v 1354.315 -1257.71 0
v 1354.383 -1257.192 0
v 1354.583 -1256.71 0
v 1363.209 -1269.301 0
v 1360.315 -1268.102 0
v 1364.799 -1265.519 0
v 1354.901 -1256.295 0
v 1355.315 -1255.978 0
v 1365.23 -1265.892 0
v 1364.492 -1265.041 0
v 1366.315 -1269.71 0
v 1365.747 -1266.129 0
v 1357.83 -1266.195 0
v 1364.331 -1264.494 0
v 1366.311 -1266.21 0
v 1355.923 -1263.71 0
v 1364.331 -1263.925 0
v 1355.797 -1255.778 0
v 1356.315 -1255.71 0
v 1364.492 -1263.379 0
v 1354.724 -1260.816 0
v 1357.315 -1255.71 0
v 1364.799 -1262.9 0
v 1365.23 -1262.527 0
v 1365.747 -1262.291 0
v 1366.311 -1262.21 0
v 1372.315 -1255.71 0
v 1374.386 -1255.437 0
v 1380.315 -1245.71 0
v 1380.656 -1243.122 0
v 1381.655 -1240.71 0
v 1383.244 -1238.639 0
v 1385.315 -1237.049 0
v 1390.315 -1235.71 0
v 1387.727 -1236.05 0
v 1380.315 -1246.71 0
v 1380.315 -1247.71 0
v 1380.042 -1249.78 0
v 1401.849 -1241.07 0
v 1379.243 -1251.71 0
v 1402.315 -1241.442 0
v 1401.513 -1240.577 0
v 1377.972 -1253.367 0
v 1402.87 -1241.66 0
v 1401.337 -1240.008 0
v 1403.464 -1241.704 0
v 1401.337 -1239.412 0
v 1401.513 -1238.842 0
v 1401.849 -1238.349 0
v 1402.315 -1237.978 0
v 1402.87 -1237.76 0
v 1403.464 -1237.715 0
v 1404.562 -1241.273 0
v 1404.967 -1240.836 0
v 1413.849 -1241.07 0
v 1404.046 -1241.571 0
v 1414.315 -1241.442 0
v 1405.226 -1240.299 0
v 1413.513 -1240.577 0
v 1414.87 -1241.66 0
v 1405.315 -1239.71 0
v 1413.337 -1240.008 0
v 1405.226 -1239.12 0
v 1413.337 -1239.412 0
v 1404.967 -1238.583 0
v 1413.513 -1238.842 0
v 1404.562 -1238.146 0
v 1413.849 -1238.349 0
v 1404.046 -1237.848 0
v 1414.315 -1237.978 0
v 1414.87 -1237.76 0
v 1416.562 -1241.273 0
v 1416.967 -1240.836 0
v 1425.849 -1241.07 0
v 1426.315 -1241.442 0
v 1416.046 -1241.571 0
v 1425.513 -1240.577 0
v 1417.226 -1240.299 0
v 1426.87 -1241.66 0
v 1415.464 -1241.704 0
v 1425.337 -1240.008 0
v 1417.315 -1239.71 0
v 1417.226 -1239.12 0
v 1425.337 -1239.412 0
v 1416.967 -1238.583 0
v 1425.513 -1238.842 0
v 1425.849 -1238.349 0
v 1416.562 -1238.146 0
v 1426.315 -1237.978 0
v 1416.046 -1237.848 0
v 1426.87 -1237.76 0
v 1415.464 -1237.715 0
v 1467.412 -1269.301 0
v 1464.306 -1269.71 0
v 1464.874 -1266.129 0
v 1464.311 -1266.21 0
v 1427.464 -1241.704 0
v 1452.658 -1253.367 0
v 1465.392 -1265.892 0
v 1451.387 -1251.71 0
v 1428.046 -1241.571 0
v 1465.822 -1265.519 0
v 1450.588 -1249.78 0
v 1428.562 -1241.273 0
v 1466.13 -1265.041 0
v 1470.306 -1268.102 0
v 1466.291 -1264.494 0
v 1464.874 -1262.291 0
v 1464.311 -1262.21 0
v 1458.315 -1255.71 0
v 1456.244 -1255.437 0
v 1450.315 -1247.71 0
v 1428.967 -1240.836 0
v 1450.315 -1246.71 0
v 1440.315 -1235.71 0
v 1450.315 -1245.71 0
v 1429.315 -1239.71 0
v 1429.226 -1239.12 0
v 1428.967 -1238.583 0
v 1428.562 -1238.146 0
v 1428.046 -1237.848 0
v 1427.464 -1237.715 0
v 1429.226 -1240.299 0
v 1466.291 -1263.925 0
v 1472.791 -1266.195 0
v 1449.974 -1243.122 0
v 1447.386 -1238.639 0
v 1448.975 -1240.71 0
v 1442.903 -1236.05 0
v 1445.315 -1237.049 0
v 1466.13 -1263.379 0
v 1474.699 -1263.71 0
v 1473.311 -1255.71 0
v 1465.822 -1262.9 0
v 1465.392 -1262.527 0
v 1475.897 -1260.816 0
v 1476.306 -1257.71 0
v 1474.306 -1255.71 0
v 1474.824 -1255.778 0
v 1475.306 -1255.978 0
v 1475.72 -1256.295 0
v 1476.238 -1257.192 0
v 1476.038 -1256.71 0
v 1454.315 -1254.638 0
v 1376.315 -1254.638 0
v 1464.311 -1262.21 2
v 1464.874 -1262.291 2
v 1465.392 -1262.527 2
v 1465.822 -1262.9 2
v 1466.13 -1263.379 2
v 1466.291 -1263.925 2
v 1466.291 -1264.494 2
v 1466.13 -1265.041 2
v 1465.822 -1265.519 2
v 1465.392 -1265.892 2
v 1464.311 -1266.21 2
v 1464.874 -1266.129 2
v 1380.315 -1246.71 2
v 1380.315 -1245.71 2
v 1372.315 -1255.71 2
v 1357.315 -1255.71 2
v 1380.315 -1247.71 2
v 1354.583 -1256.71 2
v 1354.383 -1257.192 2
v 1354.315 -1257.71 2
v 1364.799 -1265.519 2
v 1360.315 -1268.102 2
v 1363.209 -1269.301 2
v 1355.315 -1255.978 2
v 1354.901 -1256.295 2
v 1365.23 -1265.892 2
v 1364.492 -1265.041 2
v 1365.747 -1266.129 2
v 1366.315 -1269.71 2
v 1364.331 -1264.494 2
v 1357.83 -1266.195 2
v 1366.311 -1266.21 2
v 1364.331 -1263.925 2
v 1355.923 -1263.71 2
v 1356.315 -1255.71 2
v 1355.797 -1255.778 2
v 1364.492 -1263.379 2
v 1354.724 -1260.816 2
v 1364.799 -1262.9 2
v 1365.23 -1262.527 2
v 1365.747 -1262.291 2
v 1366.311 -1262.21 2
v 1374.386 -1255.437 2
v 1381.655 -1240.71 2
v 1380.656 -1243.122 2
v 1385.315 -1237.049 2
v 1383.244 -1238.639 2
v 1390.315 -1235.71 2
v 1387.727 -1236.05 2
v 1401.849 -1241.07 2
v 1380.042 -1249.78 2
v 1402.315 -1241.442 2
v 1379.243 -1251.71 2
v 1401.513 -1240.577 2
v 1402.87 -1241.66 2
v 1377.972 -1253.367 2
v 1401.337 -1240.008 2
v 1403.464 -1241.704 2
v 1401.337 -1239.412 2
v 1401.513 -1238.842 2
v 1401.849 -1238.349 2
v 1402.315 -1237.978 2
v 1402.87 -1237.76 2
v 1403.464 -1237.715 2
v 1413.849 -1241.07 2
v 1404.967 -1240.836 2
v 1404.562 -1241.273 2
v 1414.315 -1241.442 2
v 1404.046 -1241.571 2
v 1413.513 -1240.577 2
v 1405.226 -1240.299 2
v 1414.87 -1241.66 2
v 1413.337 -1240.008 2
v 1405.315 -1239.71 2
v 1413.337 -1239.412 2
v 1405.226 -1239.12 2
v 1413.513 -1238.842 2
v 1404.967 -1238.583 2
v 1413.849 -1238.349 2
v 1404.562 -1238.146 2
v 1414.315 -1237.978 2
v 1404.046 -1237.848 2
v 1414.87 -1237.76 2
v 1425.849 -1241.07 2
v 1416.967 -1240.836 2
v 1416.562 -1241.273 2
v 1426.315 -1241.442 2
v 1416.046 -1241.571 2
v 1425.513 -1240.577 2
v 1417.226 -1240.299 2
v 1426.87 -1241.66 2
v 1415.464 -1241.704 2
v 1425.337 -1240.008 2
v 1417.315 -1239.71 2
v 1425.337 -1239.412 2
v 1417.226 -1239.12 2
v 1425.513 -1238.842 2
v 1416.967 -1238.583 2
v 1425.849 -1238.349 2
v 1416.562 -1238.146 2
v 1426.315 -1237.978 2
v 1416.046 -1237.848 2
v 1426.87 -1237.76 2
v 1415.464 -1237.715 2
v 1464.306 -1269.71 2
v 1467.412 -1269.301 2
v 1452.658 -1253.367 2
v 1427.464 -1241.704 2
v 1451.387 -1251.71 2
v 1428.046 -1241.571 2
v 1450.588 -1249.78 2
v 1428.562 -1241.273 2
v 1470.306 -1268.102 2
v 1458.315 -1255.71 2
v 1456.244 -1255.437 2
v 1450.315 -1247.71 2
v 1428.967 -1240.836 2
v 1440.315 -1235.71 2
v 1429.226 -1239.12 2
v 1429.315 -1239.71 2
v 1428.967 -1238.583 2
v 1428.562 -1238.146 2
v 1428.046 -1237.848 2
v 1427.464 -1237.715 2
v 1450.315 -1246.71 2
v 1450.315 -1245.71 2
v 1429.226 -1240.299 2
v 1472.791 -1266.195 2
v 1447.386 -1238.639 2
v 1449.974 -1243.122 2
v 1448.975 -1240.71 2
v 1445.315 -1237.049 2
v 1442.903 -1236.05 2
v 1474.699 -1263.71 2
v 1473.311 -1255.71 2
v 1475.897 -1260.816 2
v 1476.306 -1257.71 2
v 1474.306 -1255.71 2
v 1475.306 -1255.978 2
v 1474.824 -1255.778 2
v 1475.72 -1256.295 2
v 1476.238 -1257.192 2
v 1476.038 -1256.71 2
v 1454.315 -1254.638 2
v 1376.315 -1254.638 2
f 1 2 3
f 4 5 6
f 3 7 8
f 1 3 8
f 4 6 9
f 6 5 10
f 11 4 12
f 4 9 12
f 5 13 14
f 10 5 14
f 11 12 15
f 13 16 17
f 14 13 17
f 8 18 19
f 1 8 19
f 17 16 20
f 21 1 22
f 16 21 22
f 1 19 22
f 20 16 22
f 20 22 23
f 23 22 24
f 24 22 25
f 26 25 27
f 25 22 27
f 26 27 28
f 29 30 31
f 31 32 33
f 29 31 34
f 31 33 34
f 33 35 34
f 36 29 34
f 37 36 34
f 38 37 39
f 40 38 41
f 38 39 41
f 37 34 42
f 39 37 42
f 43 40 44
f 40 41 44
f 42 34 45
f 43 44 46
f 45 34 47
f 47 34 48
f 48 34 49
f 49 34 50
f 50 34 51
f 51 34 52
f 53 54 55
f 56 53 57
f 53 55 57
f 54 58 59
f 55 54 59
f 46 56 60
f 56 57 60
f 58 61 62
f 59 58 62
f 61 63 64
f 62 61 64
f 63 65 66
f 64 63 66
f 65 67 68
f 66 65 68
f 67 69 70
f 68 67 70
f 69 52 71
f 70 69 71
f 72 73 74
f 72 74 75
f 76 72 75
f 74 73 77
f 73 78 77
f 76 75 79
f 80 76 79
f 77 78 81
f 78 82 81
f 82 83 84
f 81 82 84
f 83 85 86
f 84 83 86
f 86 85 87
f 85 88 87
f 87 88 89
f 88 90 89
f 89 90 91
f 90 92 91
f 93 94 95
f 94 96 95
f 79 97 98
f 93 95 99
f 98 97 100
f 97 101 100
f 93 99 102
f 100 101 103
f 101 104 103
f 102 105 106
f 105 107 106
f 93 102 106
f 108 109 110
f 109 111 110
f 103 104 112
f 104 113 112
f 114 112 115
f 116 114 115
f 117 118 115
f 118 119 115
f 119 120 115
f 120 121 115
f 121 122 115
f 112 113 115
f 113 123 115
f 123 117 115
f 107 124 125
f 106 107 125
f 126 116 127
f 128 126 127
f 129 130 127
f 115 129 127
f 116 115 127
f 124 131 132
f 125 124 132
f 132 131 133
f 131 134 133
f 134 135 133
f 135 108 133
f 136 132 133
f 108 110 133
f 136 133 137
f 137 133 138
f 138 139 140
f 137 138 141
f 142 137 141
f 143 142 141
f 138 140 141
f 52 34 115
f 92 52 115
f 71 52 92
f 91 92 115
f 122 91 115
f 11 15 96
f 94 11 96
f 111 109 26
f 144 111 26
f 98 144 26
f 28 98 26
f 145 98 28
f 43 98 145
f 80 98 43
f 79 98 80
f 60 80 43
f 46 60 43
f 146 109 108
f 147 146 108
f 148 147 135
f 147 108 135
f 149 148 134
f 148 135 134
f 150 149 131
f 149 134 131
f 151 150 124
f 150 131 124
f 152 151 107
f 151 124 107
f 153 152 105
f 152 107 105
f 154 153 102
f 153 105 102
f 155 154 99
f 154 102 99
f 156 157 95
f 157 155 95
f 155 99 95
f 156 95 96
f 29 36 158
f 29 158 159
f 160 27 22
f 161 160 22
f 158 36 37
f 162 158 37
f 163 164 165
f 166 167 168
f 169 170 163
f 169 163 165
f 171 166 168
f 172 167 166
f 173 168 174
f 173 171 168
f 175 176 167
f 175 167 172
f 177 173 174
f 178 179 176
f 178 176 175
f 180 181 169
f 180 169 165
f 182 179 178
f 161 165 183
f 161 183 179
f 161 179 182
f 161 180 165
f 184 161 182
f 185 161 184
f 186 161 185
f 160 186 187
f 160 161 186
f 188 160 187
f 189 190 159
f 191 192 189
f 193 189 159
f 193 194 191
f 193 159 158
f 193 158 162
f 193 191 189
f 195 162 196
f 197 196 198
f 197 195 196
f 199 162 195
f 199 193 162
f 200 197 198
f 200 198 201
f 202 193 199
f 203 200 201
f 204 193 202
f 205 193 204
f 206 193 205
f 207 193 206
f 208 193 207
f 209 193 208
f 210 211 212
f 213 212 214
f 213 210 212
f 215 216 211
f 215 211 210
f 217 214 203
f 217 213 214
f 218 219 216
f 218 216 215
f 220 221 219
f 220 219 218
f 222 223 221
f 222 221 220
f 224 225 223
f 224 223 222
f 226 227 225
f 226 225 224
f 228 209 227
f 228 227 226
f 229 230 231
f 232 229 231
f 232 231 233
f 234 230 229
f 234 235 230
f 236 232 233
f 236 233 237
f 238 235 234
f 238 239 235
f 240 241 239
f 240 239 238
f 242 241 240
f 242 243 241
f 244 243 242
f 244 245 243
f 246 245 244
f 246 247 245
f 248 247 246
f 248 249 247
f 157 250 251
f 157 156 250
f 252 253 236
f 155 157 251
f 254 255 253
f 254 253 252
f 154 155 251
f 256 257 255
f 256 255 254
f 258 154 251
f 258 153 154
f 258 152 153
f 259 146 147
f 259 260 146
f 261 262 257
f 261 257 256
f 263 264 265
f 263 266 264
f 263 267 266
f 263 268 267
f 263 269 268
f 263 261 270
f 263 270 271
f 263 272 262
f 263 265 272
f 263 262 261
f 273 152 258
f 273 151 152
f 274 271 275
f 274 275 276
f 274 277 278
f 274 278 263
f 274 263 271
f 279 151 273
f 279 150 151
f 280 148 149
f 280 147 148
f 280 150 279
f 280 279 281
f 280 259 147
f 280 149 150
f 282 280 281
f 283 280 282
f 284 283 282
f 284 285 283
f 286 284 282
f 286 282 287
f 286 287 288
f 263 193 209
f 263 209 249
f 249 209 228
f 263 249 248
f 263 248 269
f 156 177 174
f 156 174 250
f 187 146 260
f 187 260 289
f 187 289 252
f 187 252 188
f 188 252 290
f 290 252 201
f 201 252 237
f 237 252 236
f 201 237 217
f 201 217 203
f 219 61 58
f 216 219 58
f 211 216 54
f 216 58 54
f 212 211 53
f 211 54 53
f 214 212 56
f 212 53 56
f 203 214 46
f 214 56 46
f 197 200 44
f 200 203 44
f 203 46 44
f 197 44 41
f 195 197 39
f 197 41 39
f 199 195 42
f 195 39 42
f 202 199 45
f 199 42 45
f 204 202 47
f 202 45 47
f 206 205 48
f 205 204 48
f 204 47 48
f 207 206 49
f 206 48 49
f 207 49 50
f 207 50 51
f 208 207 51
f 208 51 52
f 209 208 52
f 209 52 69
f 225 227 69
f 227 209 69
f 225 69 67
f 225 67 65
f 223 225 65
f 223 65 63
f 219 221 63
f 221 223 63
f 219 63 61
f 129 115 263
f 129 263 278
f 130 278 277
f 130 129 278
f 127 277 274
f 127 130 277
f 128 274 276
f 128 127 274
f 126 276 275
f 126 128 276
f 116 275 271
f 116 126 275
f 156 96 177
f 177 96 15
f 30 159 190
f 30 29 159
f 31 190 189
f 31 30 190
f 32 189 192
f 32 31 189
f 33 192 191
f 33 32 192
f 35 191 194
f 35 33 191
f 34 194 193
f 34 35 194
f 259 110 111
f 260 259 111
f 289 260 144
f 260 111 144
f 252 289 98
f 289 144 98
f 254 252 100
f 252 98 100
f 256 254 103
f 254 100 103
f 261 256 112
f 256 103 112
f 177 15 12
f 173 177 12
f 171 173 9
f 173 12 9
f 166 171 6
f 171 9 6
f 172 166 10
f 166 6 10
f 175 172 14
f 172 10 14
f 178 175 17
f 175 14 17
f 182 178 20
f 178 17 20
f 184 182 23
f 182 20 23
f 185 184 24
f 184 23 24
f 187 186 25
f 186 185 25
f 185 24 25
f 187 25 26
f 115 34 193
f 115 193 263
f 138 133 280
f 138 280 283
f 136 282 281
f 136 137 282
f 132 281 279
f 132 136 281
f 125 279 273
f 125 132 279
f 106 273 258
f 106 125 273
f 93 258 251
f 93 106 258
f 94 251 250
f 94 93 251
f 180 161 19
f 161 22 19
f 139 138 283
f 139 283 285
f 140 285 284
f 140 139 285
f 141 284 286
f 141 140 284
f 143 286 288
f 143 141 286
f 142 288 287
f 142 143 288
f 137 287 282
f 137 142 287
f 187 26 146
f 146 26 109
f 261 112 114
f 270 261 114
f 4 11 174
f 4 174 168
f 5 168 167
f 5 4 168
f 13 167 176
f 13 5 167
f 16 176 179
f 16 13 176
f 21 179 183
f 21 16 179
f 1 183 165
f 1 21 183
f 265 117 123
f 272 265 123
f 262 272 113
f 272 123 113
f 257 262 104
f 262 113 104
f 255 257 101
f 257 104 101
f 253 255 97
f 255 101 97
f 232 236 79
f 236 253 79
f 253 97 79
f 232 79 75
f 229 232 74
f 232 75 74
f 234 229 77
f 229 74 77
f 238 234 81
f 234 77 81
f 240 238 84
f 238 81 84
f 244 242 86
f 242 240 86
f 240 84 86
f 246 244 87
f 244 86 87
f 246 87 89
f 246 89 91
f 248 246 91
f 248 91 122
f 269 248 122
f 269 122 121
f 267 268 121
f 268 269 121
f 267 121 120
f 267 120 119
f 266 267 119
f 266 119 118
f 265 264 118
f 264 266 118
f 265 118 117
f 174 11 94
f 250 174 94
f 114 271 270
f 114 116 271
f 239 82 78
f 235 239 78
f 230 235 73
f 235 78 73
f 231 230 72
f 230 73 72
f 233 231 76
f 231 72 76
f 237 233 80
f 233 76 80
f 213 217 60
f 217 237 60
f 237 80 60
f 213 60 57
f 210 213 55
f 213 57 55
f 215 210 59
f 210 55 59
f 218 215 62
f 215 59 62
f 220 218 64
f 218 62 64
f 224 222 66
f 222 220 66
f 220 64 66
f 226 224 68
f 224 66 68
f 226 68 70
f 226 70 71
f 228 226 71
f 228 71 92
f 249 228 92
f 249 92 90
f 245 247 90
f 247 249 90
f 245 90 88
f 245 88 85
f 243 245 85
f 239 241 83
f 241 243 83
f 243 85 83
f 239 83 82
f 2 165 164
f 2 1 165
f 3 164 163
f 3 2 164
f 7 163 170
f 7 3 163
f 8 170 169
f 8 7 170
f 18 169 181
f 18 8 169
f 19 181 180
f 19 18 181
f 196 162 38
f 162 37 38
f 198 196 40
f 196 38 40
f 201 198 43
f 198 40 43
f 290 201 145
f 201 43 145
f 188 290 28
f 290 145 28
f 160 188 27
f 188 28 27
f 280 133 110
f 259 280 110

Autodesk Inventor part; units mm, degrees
ref_plane "YZ Plane" through (0, 0, 0) normal (1, 0, 0) x (0, 1, 0)
ref_plane "XZ Plane" through (0, 0, 0) normal (0, 1, 0) x (-1, 0, 0)
ref_plane "XY Plane" through (0, 0, 0) normal (0, 0, 1) x (1, 0, 0)
sketch "Эскиз1" plane through (0, 0, 0) normal (0, 0, 1) x (1, 0, 0)
  line L0 (1380.315, -1246.7097) -> (1380.315, -1245.7097)
  line L1 (1390.315, -1235.7097) -> (1440.315, -1235.7097)
  line L2 (1450.315, -1245.7097) -> (1450.315, -1246.7097)
  arc A0 (1390.315, -1235.7097) -> (1380.315, -1245.7097) centre (1390.315, -1245.7097) ccw
  arc A1 (1450.315, -1245.7097) -> (1440.315, -1235.7097) centre (1440.315, -1245.7097) ccw
  line L3 (1380.315, -1246.7097) -> (1380.315, -1247.7097)
  line L4 (1372.315, -1255.7097) -> (1357.315, -1255.7097)
  line L5 (1473.3109, -1255.7097) -> (1458.315, -1255.7097)
  line L6 (1450.315, -1247.7097) -> (1450.315, -1246.7097)
  arc A2 (1372.315, -1255.7097) -> (1380.315, -1247.7097) centre (1372.315, -1247.7097) ccw
  arc A3 (1450.315, -1247.7097) -> (1458.315, -1255.7097) centre (1458.315, -1247.7097) ccw
  circle A4 centre (1415.315, -1239.7097) radius 2
  line L7 (1357.315, -1255.7097) -> (1356.315, -1255.7097)
  arc A5 (1356.315, -1255.7097) -> (1354.315, -1257.7097) centre (1356.315, -1257.7097) ccw
  line L8 (1473.3109, -1255.7097) -> (1474.3062, -1255.7097)
  arc A6 (1476.3062, -1257.7097) -> (1474.3062, -1255.7097) centre (1474.3062, -1257.7097) ccw
  circle A7 centre (1427.315, -1239.7097) radius 2
  arc A8 (1366.3109, -1262.2097) -> (1366.3109, -1266.2097) centre (1366.3109, -1264.2097) ccw
  arc A9 (1464.3109, -1266.2097) -> (1464.3109, -1262.2097) centre (1464.3109, -1264.2097) ccw
  line L9 (1366.3109, -1262.2097) -> (1464.3109, -1262.2097)
  line L10 (1464.3109, -1266.2097) -> (1366.3109, -1266.2097)
  line L11 (1366.315, -1269.7097) -> (1464.3062, -1269.7097)
  line L12 (1476.3062, -1257.7097) -> (1476.3062, -1257.7097)
  line L13 (1354.315, -1257.7097) -> (1354.315, -1257.7097)
  arc A10 (1354.315, -1257.7097) -> (1366.315, -1269.7097) centre (1366.315, -1257.7097) ccw
  arc A11 (1464.3062, -1269.7097) -> (1476.3062, -1257.7097) centre (1464.3062, -1257.7097) ccw
  circle A12 centre (1403.315, -1239.7097) radius 2
  point P0 (0, 0)
  point P1 (1450.315, -1235.7097)
  point P2 (1380.315, -1255.7097)
  point P3 (1354.315, -1255.7097)
  point P4 (1476.3109, -1270.2097)
extrude "Выдавливание3" add sketch "Эскиз1" along normal blind 2
properties part number "NEW Бампер"
